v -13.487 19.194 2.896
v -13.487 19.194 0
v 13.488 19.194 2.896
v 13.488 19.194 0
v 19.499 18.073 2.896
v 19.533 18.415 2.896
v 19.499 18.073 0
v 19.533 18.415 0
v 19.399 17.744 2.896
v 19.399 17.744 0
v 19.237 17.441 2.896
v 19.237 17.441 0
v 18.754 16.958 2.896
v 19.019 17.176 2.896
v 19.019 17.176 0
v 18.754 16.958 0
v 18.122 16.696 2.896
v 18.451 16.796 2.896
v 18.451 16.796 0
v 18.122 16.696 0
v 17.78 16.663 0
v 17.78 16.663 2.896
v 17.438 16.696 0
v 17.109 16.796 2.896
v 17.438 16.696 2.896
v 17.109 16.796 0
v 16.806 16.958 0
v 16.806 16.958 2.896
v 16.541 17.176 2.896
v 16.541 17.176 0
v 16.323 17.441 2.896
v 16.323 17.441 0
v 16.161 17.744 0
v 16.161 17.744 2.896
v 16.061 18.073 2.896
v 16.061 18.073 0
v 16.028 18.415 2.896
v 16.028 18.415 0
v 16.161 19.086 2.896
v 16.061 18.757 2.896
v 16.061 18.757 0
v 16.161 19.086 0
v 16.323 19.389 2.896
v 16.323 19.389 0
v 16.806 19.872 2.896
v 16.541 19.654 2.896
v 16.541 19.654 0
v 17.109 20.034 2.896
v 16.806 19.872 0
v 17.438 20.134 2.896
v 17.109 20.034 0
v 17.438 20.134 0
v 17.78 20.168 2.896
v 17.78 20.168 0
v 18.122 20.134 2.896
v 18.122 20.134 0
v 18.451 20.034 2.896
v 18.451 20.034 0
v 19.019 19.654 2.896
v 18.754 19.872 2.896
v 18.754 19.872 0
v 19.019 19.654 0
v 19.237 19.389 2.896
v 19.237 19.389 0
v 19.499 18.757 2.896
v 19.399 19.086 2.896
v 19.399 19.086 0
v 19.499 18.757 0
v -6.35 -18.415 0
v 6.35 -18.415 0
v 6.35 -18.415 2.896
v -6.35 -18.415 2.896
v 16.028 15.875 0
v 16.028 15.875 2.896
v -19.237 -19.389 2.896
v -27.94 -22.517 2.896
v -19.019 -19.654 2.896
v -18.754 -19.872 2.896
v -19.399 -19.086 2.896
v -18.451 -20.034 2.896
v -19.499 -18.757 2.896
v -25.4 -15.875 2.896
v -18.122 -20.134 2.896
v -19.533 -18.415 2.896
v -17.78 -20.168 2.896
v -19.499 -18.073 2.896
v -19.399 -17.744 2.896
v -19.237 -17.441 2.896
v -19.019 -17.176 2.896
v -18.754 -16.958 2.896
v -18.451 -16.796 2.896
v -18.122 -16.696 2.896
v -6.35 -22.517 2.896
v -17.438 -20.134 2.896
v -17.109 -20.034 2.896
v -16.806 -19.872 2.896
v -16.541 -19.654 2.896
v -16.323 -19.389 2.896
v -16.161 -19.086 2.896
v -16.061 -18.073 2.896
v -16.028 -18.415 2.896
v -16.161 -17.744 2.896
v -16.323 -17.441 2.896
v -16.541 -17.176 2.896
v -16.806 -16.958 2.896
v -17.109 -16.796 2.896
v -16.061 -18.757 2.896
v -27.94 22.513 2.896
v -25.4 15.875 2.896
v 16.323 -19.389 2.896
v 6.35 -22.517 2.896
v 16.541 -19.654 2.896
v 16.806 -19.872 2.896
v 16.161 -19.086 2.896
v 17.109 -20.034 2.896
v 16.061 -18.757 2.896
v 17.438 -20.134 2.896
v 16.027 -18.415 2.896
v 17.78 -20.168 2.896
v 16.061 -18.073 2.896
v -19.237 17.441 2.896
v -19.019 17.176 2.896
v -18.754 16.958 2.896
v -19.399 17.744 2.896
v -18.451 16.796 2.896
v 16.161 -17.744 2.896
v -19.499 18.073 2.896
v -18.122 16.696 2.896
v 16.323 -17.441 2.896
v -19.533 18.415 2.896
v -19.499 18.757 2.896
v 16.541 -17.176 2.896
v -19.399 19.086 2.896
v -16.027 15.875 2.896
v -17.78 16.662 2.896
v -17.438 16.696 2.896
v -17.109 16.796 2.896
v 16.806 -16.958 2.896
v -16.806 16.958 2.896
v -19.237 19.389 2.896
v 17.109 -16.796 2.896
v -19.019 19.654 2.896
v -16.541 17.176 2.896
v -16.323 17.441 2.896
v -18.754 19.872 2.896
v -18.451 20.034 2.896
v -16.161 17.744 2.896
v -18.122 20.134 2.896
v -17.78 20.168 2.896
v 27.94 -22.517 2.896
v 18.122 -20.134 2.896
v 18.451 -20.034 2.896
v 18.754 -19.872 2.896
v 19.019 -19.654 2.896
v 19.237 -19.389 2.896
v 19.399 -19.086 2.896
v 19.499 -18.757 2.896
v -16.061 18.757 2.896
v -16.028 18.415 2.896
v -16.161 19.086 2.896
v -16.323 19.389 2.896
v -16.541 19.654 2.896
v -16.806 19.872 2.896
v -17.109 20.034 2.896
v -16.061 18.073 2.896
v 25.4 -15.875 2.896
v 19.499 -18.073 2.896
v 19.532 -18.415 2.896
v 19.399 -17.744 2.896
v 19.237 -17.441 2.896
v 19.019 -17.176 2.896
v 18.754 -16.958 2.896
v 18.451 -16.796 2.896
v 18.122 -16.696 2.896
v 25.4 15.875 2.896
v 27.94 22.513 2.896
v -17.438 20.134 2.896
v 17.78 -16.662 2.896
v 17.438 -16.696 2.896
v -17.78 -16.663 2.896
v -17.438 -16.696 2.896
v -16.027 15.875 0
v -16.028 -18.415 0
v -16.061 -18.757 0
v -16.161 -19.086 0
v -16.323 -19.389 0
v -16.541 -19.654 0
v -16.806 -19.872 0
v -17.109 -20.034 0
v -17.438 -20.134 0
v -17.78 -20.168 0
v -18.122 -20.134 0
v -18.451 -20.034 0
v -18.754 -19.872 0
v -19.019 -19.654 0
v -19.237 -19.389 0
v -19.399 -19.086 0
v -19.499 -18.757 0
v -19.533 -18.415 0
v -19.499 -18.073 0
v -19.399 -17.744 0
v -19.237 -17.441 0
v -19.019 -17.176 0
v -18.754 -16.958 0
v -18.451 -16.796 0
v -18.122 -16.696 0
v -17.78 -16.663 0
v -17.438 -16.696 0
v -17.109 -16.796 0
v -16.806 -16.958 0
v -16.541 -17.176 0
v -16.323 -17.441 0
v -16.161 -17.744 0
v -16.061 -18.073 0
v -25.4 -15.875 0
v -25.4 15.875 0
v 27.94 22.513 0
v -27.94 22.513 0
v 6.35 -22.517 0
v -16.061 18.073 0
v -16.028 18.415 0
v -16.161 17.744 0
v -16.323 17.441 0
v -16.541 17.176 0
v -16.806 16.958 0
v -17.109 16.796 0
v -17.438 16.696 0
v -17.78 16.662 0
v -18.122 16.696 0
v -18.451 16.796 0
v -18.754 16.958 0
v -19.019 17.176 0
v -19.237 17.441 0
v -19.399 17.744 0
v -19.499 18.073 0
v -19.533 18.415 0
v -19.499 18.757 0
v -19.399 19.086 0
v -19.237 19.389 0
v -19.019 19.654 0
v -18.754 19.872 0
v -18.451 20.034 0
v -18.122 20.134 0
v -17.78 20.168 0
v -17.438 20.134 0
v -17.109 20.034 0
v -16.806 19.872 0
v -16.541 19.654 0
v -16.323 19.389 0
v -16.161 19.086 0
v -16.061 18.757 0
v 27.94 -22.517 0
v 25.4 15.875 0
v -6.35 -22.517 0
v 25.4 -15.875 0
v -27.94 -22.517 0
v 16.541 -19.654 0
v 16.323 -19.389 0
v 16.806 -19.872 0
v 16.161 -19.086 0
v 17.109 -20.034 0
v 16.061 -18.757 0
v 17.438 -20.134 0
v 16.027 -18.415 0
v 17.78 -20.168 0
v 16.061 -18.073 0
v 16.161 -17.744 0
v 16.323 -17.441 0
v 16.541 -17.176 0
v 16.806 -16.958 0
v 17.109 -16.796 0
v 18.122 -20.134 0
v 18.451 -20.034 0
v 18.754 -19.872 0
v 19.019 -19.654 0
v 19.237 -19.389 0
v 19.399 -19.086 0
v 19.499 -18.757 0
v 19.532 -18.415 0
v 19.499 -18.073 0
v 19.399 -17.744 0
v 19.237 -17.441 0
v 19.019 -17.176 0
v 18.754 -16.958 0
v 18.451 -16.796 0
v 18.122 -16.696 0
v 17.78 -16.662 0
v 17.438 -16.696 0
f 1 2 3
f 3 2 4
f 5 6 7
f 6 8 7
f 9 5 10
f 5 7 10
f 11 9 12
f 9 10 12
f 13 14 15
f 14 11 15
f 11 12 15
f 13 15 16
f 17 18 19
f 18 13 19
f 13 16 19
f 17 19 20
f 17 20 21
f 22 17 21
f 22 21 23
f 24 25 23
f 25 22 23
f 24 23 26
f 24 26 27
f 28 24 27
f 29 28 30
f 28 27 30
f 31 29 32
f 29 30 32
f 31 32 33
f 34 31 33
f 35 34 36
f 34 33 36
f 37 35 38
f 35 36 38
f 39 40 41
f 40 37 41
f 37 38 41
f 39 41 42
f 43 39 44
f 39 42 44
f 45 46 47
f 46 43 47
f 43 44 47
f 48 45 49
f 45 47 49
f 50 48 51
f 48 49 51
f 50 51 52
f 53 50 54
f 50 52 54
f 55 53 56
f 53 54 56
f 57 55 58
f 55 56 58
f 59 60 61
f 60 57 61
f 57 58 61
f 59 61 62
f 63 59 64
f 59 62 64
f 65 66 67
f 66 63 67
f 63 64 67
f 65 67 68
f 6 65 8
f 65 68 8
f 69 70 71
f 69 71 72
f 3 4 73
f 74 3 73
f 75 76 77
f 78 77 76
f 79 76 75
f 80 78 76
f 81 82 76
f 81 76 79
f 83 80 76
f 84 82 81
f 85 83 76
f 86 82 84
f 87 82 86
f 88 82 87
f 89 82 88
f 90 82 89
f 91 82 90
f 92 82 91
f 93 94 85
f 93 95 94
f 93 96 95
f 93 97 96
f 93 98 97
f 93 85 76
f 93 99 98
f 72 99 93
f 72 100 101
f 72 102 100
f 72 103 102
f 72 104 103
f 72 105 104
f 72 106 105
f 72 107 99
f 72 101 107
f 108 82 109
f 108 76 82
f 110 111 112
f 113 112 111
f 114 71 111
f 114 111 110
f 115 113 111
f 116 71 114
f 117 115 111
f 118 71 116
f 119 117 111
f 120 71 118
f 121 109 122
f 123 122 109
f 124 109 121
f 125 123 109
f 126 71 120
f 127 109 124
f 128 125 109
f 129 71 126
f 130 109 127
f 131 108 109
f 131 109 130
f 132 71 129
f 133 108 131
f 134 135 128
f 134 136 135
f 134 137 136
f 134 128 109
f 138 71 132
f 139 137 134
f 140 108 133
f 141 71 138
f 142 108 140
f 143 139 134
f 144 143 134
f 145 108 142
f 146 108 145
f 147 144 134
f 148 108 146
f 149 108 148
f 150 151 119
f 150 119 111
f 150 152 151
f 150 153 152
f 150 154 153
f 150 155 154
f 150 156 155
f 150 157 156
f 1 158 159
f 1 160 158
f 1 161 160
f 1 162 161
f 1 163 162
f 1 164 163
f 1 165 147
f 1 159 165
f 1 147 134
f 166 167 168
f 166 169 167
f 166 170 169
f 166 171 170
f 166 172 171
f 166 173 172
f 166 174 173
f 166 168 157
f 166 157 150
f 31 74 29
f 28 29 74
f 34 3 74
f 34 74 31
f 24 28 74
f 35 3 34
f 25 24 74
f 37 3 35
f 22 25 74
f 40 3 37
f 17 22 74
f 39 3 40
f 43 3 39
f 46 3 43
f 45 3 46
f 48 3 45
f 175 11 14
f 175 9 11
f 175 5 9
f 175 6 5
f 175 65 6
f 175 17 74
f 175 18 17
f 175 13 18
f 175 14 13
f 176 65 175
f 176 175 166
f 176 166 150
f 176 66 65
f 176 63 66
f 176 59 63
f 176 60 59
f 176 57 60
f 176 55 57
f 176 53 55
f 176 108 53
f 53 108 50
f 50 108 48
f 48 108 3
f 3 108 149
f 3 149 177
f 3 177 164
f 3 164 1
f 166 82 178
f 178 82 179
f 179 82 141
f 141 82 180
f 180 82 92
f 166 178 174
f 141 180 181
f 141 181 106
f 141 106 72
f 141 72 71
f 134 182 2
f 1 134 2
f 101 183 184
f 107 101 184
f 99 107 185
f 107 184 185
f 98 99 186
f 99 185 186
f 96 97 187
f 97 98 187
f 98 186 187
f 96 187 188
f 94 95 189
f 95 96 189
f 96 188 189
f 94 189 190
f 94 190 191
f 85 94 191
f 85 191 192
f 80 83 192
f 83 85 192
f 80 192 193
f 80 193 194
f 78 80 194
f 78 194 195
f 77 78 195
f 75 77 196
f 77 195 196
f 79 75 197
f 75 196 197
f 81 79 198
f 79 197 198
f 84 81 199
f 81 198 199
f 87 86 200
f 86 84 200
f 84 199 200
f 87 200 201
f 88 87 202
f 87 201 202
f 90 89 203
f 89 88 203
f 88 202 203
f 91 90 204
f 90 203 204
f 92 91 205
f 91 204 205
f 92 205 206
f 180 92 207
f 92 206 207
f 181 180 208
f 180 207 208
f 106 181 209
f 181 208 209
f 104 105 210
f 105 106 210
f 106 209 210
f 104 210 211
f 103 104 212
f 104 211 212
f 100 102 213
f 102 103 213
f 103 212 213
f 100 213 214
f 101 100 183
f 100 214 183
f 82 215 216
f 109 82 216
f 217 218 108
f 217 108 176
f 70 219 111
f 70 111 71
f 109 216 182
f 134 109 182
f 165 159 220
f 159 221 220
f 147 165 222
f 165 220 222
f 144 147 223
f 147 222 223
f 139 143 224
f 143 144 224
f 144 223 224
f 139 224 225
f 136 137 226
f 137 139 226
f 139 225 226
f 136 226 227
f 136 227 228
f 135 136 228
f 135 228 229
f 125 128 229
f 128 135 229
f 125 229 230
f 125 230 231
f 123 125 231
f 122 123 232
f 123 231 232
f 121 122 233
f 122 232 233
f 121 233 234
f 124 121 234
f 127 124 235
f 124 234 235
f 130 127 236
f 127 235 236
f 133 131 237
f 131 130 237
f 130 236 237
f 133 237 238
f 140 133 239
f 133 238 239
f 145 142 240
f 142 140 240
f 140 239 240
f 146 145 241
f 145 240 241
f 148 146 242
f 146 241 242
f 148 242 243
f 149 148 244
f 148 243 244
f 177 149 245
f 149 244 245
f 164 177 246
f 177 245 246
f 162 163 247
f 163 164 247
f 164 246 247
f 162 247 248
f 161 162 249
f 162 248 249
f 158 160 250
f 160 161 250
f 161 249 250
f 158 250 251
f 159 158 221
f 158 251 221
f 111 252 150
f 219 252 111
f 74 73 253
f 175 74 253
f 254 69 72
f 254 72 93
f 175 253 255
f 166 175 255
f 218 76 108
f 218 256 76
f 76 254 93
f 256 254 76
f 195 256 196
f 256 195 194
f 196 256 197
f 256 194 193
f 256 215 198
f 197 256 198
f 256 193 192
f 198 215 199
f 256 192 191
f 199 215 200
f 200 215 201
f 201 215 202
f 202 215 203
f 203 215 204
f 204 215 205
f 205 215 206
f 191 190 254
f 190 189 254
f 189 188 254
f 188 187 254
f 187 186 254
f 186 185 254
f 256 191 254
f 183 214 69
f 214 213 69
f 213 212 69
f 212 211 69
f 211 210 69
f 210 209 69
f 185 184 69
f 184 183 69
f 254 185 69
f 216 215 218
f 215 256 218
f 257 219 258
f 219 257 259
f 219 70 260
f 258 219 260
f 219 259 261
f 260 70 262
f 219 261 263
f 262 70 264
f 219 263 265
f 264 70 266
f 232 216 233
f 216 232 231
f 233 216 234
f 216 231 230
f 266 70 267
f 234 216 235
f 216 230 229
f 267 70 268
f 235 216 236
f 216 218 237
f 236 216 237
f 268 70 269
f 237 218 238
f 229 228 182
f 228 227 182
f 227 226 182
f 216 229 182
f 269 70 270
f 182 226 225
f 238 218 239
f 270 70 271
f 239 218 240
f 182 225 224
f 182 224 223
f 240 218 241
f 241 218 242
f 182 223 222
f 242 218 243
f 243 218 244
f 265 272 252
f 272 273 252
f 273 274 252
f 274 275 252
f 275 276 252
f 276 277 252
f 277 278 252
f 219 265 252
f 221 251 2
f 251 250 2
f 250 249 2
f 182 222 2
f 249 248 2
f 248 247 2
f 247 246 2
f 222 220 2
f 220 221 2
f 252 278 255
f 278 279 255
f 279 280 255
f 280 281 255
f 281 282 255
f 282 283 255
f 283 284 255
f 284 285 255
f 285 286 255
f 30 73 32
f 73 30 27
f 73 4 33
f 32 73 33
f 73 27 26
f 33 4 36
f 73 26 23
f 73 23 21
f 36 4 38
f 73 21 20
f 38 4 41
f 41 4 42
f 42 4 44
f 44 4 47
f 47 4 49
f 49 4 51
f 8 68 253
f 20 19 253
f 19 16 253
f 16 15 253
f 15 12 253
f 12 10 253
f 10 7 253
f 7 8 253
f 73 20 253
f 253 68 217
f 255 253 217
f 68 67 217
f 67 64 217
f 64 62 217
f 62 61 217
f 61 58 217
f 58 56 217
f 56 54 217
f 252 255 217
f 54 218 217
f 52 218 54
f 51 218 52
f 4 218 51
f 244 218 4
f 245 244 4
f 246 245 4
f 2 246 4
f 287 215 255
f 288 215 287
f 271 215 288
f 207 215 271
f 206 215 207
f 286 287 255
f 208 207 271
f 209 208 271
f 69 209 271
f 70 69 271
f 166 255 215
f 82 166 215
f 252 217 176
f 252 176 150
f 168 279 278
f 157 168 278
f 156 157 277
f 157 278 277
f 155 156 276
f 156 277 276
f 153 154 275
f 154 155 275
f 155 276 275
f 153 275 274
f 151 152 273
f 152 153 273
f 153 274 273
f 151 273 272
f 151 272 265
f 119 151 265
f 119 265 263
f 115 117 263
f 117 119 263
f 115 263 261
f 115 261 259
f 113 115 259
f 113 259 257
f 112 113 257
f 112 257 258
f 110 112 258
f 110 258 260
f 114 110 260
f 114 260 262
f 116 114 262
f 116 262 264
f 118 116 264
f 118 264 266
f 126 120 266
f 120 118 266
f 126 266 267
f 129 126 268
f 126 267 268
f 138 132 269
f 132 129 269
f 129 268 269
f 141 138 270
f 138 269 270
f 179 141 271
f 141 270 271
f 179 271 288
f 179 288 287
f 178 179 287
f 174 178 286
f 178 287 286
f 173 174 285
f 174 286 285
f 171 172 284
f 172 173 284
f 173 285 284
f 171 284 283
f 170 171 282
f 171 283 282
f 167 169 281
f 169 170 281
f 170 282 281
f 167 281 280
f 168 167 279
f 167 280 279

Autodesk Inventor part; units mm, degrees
ref_plane "YZ Plane" through (0, 0, 0) normal (1, 0, 0) x (0, 1, 0)
ref_plane "XZ Plane" through (0, 0, 0) normal (0, 1, 0) x (-1, 0, 0)
ref_plane "XY Plane" through (0, 0, 0) normal (0, 0, 1) x (1, 0, 0)
sketch "Sketch1" plane through (0, 0, 0) normal (0, 0, 1) x (1, 0, 0)
  circle A0 centre (-17.78, 18.415) radius 1.7525
  circle A1 centre (17.7801, 18.4151) radius 1.7525
  circle A2 centre (-17.78, -18.4151) radius 1.7525
  circle A3 centre (17.7799, -18.415) radius 1.7525
  line L0 (6.35, -18.415) -> (-6.35, -18.415)
  line L1 (-6.35, -18.415) -> (-6.35, -22.5171)
  line L2 (-6.35, -22.5171) -> (-27.94, -22.5171)
  line L3 (-27.94, -22.5171) -> (-27.94, 22.513)
  line L4 (-27.94, 22.513) -> (27.94, 22.513)
  line L5 (27.94, 22.513) -> (27.94, -22.5171)
  line L6 (27.94, -22.5171) -> (6.35, -22.5171)
  line L7 (6.35, -22.5171) -> (6.35, -18.415)
  line L8 (16.0276, 15.875) -> (25.4, 15.875)
  line L9 (25.4, 15.875) -> (25.4, -15.875)
  line L10 (25.4, -15.875) -> (-25.4, -15.875)
  line L11 (-25.4, -15.875) -> (-25.4, 15.875)
  line L12 (-25.4, 15.875) -> (-16.0274, 15.875)
  line L13 (-16.0274, 15.875) -> (-13.4874, 19.194)
  line L14 (-13.4874, 19.194) -> (13.4876, 19.194)
  line L15 (13.4876, 19.194) -> (16.0276, 15.875)
  point P0 (0, 0)
extrude "Extrusion1" add sketch "Sketch1" along normal blind 2.8956
properties part number "battery_mount"
